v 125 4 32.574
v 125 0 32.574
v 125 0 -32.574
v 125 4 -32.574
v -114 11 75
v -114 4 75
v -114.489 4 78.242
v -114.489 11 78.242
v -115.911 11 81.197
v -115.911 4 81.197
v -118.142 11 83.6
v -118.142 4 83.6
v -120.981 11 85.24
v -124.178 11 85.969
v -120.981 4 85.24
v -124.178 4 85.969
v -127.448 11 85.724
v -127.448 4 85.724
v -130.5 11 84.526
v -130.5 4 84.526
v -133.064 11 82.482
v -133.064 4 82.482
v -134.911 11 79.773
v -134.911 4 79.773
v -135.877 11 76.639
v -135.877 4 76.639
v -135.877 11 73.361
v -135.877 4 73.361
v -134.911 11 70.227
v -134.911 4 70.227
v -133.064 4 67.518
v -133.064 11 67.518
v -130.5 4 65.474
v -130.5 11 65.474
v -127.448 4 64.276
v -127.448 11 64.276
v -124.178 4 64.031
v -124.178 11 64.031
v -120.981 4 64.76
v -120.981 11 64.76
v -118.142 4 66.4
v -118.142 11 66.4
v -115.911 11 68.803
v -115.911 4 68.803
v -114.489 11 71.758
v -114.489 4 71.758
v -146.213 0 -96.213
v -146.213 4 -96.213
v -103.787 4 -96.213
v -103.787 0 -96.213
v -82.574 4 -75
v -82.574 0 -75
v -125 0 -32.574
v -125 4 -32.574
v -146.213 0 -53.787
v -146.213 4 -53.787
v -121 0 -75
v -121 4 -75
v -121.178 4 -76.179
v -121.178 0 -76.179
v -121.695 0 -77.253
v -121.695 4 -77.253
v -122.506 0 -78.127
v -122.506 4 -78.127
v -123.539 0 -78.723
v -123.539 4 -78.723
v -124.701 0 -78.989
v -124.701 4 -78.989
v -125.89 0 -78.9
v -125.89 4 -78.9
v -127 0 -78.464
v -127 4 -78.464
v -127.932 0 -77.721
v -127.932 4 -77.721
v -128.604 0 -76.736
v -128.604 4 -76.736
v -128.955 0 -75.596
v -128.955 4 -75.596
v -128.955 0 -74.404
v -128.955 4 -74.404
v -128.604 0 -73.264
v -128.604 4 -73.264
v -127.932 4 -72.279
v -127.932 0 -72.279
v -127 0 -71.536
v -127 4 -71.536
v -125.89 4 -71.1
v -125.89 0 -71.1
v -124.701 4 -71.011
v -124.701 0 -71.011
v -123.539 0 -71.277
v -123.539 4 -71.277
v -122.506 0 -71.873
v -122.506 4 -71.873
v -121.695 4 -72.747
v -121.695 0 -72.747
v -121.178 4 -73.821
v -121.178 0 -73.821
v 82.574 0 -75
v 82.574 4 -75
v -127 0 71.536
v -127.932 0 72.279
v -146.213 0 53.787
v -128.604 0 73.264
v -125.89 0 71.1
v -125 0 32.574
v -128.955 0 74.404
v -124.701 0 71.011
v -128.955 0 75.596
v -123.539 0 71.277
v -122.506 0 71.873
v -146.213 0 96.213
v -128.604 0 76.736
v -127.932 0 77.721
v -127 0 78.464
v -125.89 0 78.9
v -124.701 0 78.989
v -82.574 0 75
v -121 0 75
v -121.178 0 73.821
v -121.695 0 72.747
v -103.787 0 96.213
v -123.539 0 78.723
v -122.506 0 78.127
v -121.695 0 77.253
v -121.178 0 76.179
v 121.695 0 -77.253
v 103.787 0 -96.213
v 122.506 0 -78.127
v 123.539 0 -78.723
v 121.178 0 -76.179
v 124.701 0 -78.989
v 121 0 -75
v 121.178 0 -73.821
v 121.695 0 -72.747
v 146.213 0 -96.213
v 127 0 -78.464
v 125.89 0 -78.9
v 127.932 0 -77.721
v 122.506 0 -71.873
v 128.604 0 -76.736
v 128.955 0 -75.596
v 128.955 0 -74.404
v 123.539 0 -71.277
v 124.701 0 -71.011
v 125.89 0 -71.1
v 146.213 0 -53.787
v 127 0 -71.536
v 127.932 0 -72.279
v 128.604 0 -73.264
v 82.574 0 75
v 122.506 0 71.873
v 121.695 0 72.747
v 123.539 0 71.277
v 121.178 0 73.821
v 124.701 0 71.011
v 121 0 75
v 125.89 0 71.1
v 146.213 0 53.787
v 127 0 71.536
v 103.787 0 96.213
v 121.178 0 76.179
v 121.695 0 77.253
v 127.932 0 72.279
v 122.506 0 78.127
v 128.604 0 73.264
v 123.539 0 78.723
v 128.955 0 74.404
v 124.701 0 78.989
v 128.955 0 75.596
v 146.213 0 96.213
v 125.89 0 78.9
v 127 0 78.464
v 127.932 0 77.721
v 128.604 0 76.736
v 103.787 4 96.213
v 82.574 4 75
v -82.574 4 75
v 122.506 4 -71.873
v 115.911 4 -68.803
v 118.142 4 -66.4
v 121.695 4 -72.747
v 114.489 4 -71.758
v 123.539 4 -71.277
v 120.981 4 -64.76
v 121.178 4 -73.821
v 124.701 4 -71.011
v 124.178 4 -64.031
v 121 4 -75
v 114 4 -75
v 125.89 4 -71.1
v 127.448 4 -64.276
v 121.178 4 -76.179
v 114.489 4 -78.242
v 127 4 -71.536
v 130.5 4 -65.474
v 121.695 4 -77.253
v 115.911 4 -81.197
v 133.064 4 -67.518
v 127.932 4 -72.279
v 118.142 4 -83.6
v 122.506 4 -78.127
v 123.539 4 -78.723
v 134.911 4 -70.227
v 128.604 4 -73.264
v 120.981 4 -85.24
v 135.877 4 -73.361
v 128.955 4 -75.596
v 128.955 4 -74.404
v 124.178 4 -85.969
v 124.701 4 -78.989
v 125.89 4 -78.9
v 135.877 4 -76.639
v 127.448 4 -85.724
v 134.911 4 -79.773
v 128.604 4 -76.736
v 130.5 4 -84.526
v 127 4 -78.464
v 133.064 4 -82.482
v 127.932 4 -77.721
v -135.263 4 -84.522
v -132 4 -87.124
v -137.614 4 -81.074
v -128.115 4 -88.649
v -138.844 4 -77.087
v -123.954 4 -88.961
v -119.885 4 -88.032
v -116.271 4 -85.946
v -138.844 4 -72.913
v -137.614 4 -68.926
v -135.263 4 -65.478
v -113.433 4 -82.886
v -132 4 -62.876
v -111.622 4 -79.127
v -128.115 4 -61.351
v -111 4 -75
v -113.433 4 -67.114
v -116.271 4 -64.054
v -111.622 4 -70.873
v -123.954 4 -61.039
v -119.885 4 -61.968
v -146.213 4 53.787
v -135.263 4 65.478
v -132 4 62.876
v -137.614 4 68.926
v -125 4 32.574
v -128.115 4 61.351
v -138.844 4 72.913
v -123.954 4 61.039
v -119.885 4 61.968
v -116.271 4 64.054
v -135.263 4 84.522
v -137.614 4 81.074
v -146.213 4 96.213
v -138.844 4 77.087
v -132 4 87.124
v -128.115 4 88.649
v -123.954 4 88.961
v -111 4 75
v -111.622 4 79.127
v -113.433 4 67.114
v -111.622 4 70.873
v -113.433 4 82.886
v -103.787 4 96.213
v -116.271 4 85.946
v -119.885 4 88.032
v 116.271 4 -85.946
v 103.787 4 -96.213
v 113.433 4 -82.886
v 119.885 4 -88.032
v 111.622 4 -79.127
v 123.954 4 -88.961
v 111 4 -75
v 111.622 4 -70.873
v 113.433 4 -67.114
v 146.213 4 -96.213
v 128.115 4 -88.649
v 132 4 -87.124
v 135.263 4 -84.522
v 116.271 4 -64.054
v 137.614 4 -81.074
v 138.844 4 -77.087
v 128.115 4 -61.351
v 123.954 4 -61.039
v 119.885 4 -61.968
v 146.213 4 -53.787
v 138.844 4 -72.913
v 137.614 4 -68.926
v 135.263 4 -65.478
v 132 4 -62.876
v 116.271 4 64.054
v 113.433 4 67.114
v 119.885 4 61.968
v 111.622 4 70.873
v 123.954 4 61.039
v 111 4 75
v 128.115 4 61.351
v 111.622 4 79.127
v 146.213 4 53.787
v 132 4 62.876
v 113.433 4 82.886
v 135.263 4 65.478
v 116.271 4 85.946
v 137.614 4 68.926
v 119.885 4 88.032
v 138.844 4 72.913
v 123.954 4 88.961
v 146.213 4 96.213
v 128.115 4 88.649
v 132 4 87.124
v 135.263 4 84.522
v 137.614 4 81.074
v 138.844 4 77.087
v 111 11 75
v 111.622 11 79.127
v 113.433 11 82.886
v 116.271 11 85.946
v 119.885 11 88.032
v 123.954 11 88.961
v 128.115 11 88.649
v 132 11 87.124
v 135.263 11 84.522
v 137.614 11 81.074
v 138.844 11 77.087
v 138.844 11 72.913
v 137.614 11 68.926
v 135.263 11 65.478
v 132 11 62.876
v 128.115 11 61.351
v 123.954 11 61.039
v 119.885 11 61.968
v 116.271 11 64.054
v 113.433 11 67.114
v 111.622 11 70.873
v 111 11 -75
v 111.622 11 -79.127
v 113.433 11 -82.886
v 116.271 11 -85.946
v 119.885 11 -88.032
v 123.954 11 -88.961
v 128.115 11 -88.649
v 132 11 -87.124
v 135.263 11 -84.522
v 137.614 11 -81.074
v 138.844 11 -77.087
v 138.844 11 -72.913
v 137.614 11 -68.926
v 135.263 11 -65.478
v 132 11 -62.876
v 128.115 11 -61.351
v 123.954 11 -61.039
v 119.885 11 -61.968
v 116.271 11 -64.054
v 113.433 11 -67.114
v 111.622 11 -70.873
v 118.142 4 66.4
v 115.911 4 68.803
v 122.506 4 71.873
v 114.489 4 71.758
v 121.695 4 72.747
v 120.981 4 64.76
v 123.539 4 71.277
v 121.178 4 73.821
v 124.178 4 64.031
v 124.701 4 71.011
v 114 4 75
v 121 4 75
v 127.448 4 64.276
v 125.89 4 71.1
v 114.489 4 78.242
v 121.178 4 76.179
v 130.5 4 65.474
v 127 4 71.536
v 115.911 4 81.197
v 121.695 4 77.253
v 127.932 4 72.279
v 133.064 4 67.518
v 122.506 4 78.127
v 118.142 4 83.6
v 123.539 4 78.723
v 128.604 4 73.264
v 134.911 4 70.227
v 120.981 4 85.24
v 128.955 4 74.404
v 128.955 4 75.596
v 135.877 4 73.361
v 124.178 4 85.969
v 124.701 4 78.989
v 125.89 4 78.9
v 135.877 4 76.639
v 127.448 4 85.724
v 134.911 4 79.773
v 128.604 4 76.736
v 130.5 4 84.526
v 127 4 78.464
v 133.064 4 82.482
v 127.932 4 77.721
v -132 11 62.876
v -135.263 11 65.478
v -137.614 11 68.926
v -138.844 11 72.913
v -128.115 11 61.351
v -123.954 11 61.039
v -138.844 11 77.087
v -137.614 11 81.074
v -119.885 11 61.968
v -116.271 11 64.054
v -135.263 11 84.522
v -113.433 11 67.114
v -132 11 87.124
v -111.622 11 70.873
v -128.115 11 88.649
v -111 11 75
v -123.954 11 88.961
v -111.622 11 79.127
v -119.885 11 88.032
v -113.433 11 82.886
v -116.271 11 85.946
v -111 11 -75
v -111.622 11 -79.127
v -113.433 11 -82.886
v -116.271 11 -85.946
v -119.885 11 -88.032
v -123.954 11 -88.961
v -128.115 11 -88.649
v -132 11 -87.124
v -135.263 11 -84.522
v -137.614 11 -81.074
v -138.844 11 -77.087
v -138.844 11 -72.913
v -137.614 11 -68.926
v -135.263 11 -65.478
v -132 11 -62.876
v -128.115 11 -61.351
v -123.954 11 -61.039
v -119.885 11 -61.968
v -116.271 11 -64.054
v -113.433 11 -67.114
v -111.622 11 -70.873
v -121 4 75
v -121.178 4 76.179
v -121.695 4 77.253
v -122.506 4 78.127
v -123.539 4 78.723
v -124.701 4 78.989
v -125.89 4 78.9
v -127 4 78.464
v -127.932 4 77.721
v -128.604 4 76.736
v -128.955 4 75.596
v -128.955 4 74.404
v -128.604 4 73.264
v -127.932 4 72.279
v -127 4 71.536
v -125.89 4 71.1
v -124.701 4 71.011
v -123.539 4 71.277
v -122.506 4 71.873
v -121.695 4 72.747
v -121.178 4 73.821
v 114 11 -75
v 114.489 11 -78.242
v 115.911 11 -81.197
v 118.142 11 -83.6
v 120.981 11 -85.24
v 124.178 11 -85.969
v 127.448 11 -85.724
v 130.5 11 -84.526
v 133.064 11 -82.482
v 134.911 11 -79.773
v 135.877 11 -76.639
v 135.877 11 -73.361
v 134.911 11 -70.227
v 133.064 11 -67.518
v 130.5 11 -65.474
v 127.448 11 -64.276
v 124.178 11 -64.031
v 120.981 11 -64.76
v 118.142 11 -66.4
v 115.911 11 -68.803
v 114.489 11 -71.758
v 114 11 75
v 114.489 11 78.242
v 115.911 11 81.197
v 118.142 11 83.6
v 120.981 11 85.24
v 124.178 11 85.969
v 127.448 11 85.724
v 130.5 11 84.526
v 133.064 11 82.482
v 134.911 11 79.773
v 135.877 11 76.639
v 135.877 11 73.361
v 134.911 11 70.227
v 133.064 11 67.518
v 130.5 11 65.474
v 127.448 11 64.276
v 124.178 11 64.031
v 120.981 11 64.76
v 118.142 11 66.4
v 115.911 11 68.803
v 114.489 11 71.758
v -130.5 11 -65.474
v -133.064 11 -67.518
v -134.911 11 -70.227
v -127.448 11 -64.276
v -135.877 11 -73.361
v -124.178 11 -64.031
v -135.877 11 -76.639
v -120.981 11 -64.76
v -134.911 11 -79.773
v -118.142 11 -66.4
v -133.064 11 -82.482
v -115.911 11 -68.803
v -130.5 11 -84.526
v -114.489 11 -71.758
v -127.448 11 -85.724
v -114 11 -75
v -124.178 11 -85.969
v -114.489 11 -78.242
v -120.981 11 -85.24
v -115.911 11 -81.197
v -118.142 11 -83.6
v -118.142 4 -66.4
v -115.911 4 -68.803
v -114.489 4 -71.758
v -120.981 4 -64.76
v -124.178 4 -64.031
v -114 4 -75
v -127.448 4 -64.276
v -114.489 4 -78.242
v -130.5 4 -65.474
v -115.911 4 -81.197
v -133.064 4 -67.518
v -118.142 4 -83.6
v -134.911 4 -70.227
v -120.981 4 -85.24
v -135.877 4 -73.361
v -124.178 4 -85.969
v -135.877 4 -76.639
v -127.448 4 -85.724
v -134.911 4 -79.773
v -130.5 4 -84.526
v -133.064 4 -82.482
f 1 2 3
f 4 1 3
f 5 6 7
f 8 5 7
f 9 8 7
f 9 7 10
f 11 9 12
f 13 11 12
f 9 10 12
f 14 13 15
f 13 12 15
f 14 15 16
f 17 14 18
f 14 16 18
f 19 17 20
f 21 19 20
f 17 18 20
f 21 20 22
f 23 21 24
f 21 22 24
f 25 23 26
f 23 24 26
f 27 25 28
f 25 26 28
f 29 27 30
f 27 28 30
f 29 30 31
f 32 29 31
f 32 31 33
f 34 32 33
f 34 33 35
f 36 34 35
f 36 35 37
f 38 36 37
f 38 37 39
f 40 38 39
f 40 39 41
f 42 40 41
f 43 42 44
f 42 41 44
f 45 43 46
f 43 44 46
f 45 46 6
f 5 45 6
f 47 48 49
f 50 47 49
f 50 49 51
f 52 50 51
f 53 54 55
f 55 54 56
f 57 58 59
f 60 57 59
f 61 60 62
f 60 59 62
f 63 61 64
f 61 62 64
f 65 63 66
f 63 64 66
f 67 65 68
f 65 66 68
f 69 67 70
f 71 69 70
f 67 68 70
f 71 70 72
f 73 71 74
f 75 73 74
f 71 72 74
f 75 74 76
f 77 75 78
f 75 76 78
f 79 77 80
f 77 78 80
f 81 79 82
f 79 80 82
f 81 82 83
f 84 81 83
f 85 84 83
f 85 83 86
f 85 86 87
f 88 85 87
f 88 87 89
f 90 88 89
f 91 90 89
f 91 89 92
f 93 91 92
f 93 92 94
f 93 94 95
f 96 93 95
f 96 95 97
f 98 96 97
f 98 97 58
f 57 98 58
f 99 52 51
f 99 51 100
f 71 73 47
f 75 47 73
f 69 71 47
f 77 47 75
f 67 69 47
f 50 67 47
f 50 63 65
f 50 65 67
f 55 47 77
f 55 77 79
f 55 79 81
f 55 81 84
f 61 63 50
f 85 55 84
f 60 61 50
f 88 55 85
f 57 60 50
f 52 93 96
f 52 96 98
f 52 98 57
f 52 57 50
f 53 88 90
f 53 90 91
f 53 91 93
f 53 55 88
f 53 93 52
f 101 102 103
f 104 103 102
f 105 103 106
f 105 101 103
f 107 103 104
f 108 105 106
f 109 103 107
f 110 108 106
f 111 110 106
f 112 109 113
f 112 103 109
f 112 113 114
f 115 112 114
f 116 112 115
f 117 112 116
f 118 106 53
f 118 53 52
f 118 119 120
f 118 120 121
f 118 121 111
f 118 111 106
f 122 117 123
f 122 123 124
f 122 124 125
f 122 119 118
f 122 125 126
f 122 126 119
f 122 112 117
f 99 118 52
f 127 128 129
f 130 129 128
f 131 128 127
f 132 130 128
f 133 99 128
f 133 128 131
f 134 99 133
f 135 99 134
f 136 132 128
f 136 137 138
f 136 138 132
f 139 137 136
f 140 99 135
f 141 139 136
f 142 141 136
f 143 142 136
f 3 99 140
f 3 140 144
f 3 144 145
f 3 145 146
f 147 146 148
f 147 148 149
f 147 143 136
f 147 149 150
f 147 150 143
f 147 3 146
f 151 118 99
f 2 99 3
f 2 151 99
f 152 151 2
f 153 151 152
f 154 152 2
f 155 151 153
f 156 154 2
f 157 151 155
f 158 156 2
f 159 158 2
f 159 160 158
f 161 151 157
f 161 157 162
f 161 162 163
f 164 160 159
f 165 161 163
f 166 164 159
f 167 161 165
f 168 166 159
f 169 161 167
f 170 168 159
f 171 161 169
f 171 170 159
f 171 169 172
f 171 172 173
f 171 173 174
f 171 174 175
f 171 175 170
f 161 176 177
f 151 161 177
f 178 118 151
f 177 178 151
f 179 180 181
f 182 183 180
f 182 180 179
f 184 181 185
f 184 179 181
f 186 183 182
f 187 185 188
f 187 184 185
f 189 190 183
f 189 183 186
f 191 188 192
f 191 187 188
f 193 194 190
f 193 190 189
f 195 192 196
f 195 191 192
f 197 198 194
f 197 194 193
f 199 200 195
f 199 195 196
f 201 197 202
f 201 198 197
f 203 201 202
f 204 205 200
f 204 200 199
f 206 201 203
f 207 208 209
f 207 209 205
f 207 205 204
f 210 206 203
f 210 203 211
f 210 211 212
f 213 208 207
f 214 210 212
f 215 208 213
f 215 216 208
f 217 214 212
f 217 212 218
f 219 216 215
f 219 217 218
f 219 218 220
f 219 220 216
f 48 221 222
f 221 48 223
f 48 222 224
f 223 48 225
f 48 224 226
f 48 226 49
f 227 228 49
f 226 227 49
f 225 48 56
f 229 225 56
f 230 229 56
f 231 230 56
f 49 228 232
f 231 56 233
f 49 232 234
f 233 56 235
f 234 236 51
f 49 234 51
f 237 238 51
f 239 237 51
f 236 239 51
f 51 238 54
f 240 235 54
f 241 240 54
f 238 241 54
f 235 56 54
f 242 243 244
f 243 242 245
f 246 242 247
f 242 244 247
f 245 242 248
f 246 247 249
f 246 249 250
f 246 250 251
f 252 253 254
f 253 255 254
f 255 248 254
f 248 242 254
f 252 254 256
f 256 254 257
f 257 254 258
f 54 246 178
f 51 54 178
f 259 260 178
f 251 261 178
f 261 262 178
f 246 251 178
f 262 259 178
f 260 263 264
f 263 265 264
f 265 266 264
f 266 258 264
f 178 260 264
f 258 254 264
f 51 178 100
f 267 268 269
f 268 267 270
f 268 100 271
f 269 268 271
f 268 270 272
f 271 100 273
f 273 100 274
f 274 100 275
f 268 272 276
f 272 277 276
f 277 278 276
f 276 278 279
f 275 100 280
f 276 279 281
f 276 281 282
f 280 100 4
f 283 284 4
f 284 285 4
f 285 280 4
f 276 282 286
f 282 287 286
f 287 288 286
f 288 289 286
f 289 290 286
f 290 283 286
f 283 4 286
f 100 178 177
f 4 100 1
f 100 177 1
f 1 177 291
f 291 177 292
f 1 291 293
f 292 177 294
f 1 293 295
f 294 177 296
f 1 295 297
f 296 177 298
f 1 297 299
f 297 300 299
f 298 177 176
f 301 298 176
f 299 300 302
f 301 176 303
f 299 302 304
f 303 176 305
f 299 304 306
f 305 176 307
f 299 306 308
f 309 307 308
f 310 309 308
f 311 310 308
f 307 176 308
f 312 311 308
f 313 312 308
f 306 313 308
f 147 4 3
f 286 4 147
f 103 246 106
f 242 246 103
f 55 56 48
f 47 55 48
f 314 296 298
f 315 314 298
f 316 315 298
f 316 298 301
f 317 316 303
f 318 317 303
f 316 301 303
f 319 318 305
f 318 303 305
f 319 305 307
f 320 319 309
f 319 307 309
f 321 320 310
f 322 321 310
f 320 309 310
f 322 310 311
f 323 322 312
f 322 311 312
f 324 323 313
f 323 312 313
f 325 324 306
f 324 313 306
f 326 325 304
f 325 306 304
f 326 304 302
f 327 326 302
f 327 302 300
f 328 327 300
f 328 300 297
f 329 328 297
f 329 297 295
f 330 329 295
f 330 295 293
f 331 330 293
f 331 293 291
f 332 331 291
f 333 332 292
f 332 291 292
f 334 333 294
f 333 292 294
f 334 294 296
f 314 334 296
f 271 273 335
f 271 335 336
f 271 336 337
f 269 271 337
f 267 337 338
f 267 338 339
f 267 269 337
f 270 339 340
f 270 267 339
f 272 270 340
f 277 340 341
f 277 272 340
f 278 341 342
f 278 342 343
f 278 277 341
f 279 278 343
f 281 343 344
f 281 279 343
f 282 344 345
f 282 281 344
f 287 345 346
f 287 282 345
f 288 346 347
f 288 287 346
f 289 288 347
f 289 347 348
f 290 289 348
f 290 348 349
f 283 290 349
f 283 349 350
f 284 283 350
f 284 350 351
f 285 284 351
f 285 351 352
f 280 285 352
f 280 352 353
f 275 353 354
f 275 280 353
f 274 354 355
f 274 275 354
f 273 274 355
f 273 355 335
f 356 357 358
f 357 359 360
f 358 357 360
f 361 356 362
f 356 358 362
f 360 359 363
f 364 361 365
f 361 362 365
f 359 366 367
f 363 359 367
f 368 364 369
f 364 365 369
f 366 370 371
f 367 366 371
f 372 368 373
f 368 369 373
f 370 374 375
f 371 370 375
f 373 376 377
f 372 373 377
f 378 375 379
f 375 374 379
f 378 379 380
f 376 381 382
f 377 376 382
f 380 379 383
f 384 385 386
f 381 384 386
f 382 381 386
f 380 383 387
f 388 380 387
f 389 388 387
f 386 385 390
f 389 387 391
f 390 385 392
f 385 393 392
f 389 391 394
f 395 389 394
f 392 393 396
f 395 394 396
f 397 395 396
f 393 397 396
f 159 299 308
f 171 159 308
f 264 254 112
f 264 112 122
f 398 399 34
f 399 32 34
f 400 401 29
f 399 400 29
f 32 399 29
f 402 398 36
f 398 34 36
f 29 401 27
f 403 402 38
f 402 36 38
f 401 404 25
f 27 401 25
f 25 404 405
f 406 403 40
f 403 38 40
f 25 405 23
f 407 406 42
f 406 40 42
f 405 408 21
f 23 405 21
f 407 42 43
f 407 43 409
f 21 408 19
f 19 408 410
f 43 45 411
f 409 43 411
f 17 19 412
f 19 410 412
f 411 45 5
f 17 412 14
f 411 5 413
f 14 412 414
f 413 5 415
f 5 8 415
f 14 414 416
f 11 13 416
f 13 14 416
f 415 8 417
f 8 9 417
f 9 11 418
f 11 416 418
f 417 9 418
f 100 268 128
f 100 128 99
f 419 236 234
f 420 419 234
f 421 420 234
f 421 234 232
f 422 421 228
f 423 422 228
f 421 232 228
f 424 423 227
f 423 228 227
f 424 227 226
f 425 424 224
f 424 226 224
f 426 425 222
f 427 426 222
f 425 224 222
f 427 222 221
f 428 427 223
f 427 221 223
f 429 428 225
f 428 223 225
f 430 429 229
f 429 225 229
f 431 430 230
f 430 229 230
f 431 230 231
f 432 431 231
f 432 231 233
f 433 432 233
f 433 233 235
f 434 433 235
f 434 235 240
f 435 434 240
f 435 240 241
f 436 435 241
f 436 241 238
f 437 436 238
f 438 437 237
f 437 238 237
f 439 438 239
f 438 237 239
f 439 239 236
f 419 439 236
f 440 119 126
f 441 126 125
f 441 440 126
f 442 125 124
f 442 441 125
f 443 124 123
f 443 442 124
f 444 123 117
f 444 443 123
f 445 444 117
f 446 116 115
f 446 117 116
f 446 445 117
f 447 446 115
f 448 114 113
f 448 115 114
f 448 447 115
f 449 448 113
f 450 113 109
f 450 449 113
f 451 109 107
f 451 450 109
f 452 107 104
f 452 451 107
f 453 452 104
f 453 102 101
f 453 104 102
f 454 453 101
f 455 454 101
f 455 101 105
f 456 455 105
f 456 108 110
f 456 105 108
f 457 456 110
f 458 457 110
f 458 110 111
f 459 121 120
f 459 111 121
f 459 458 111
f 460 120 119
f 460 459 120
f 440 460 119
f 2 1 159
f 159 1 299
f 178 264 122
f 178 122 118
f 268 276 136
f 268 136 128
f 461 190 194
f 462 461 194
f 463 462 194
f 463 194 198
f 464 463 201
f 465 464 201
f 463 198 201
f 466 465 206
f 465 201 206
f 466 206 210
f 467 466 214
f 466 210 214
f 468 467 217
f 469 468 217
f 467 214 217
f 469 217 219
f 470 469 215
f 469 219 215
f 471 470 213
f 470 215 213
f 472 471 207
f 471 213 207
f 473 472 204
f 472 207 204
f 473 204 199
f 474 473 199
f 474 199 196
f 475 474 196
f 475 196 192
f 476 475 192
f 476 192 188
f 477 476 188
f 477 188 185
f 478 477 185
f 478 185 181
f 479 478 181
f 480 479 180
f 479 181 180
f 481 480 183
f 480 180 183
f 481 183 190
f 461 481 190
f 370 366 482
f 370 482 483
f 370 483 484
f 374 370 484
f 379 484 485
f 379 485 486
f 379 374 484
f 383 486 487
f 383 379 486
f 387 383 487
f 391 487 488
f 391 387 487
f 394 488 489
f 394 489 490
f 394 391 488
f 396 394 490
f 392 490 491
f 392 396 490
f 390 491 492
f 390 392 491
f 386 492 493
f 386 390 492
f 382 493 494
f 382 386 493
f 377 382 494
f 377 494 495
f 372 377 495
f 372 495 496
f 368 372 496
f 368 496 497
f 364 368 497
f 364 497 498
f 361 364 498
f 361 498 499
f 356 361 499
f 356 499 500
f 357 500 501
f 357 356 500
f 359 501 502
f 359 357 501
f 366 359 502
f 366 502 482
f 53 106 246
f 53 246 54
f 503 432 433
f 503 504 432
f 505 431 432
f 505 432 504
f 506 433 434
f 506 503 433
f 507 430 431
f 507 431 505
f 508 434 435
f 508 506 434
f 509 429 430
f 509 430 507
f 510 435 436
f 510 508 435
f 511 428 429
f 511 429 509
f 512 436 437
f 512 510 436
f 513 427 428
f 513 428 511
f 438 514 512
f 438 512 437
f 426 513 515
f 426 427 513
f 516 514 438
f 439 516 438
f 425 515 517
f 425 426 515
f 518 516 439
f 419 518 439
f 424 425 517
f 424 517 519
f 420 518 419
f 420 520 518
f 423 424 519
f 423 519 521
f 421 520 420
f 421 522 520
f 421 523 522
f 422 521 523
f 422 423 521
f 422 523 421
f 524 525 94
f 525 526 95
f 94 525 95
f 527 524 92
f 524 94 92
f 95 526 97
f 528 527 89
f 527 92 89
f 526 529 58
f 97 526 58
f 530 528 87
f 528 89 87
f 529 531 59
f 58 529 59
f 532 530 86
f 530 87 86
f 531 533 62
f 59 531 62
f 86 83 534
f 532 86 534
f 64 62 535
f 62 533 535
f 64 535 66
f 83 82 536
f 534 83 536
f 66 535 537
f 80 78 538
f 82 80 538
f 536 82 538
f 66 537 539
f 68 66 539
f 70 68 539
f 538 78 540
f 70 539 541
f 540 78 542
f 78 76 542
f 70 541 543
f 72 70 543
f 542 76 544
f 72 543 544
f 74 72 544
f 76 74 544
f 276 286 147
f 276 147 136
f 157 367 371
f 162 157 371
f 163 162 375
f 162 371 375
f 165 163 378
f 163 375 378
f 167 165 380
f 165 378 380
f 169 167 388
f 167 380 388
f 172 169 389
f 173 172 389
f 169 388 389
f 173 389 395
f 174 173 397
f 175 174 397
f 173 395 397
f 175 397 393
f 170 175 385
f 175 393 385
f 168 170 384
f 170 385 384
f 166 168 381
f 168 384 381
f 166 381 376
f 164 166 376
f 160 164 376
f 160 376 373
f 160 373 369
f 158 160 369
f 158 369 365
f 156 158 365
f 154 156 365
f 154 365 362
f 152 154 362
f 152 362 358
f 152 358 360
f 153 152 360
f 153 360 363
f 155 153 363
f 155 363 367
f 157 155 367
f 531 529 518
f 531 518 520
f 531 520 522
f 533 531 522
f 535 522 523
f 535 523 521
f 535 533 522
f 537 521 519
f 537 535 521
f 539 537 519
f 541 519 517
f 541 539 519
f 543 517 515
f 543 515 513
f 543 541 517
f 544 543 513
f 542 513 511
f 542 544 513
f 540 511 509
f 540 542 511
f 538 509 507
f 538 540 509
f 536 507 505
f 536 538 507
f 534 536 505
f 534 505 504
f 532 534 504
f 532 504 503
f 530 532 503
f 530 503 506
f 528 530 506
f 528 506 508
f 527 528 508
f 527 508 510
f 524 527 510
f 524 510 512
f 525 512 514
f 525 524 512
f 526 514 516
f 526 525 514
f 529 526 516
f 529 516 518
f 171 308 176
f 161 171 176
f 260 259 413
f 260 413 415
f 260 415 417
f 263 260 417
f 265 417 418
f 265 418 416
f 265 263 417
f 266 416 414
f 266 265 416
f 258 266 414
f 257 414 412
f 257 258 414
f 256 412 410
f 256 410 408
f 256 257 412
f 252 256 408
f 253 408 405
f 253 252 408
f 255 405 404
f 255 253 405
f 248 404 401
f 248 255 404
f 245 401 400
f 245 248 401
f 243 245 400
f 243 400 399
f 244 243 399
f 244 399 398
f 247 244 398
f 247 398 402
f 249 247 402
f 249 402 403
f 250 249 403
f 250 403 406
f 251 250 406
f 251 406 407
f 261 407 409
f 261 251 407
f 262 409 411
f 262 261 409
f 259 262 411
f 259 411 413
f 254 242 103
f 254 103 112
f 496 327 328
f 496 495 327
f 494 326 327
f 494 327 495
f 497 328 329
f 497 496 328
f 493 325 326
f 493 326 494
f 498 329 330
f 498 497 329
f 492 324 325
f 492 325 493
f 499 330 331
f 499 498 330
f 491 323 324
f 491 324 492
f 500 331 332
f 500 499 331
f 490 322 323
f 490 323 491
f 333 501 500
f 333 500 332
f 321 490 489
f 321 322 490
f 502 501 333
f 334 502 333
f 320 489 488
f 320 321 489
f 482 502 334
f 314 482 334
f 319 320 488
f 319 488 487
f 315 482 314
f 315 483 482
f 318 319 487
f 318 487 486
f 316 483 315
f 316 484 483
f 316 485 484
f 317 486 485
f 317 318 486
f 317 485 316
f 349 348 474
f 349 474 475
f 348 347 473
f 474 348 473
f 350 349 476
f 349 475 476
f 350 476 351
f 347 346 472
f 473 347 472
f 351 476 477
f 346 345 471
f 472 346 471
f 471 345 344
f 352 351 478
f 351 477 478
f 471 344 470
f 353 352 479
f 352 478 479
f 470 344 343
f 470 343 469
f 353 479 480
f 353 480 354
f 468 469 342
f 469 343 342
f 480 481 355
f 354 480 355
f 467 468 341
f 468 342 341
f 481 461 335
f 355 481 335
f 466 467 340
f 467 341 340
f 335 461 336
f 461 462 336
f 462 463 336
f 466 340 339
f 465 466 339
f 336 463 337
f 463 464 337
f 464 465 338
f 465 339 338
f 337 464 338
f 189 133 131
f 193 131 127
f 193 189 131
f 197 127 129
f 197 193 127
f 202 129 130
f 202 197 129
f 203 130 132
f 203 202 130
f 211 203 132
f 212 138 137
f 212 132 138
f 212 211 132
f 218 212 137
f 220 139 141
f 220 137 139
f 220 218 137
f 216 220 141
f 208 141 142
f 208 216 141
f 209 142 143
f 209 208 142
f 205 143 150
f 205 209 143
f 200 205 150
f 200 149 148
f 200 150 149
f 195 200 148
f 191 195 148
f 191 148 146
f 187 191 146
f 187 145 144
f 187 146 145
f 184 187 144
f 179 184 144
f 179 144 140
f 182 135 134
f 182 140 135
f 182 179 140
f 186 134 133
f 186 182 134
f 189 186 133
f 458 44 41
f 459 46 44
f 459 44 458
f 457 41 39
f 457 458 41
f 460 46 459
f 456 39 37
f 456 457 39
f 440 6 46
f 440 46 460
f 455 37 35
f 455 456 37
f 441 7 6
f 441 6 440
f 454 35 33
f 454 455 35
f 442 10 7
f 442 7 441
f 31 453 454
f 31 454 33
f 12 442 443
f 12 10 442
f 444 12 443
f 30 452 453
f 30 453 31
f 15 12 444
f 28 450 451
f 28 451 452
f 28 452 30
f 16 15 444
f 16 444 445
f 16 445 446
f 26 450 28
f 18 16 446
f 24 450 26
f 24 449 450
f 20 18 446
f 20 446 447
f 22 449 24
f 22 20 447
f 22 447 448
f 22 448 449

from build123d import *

# Parameters (mm, degrees)
SKETCH2_W                 = 250
SKETCH2_H                 = 150
BOSS_EXTRUDE1_DEPTH       = 4
BOSS_EXTRUDE2_DEPTH       = 4
SKETCH4_R                 = 4
CUT_EXTRUDE1_DEPTH        = 5
SKETCH5_R                 = 14
SKETCH5_R_2               = 11
BOSS_EXTRUDE3_DEPTH       = 7
MIRROR2_COPY_1_DEPTH      = 4
MIRROR2_COPY_2_SKETCH_R   = 4
MIRROR2_COPY_2_DEPTH      = 5
MIRROR2_COPY_3_SKETCH_R   = 14
MIRROR2_COPY_3_SKETCH_R_2 = 11
MIRROR2_COPY_3_DEPTH      = 7


with BuildPart() as part:
    # Sketch2 → Boss-Extrude1 (new body)
    with BuildSketch(Plane(origin=(0, 0, 0), x_dir=(1, 0, 0), z_dir=(0, 1, 0))):
        Rectangle(SKETCH2_W, SKETCH2_H)
    extrude(amount=BOSS_EXTRUDE1_DEPTH)

    # Sketch3 → Boss-Extrude2 (add)
    with BuildSketch(Plane(origin=(0, 4, 0), x_dir=(1, 0, 0), z_dir=(0, 1, 0))):
        Polygon((-103.786796564, 96.213203436), (-82.573593129, 75), (-125, 75), (-125, 32.573593129), (-146.213203436, 53.786796564), (-146.213203436, 96.213203436), align=None)
    boss_extrude2 = extrude(amount=-BOSS_EXTRUDE2_DEPTH)

    # Sketch4 → Cut-Extrude1 (cut, through all)
    with BuildSketch(Plane(origin=(0, 4, 0), x_dir=(1, 0, 0), z_dir=(0, 1, 0))):
        with Locations((-125, 75)):
            Circle(SKETCH4_R)
    cut_extrude1 = extrude(amount=-CUT_EXTRUDE1_DEPTH, mode=Mode.SUBTRACT)

    # Sketch5 → Boss-Extrude3 (add)
    with BuildSketch(Plane(origin=(0, 4, 0), x_dir=(1, 0, 0), z_dir=(0, 1, 0))):
        with Locations((-125, 75)):
            Circle(SKETCH5_R)
        with Locations((-125, 75)):
            Circle(SKETCH5_R_2, mode=Mode.SUBTRACT)
    boss_extrude3 = extrude(amount=BOSS_EXTRUDE3_DEPTH)

    # Mirror1: Boss-Extrude2, Cut-Extrude1, Boss-Extrude3 across plane
    add(boss_extrude2.mirror(Plane(origin=(0, 0, 0), x_dir=(0, 0, 1), z_dir=(1, 0, 0))))
    add(cut_extrude1.mirror(Plane(origin=(0, 0, 0), x_dir=(0, 0, 1), z_dir=(1, 0, 0))), mode=Mode.SUBTRACT)
    add(boss_extrude3.mirror(Plane(origin=(0, 0, 0), x_dir=(0, 0, 1), z_dir=(1, 0, 0))))

    # Mirror2: Boss-Extrude2, Cut-Extrude1, Boss-Extrude3 across plane
    add(boss_extrude2.mirror(Plane.XY))
    add(cut_extrude1.mirror(Plane.XY), mode=Mode.SUBTRACT)
    add(boss_extrude3.mirror(Plane.XY))

    # Mirror2 copy 1 sketch → Mirror2 copy 1 (add)
    with BuildSketch(Plane(origin=(0, 4, 0), x_dir=(-1, 0, 0), z_dir=(0, 1, 0))):
        Polygon((-103.786796564, 96.213203436), (-82.573593129, 75), (-125, 75), (-125, 32.573593129), (-146.213203436, 53.786796564), (-146.213203436, 96.213203436), align=None)
    extrude(amount=-MIRROR2_COPY_1_DEPTH)

    # Mirror2 copy 2 sketch → Mirror2 copy 2 (cut, through all)
    with BuildSketch(Plane(origin=(0, 4, 0), x_dir=(-1, 0, 0), z_dir=(0, 1, 0))):
        with Locations((-125, 75)):
            Circle(MIRROR2_COPY_2_SKETCH_R)
    extrude(amount=-MIRROR2_COPY_2_DEPTH, mode=Mode.SUBTRACT)

    # Mirror2 copy 3 sketch → Mirror2 copy 3 (add)
    with BuildSketch(Plane(origin=(0, 4, 0), x_dir=(-1, 0, 0), z_dir=(0, 1, 0))):
        with Locations((-125, 75)):
            Circle(MIRROR2_COPY_3_SKETCH_R)
        with Locations((-125, 75)):
            Circle(MIRROR2_COPY_3_SKETCH_R_2, mode=Mode.SUBTRACT)
    extrude(amount=MIRROR2_COPY_3_DEPTH)


solid = part.part
